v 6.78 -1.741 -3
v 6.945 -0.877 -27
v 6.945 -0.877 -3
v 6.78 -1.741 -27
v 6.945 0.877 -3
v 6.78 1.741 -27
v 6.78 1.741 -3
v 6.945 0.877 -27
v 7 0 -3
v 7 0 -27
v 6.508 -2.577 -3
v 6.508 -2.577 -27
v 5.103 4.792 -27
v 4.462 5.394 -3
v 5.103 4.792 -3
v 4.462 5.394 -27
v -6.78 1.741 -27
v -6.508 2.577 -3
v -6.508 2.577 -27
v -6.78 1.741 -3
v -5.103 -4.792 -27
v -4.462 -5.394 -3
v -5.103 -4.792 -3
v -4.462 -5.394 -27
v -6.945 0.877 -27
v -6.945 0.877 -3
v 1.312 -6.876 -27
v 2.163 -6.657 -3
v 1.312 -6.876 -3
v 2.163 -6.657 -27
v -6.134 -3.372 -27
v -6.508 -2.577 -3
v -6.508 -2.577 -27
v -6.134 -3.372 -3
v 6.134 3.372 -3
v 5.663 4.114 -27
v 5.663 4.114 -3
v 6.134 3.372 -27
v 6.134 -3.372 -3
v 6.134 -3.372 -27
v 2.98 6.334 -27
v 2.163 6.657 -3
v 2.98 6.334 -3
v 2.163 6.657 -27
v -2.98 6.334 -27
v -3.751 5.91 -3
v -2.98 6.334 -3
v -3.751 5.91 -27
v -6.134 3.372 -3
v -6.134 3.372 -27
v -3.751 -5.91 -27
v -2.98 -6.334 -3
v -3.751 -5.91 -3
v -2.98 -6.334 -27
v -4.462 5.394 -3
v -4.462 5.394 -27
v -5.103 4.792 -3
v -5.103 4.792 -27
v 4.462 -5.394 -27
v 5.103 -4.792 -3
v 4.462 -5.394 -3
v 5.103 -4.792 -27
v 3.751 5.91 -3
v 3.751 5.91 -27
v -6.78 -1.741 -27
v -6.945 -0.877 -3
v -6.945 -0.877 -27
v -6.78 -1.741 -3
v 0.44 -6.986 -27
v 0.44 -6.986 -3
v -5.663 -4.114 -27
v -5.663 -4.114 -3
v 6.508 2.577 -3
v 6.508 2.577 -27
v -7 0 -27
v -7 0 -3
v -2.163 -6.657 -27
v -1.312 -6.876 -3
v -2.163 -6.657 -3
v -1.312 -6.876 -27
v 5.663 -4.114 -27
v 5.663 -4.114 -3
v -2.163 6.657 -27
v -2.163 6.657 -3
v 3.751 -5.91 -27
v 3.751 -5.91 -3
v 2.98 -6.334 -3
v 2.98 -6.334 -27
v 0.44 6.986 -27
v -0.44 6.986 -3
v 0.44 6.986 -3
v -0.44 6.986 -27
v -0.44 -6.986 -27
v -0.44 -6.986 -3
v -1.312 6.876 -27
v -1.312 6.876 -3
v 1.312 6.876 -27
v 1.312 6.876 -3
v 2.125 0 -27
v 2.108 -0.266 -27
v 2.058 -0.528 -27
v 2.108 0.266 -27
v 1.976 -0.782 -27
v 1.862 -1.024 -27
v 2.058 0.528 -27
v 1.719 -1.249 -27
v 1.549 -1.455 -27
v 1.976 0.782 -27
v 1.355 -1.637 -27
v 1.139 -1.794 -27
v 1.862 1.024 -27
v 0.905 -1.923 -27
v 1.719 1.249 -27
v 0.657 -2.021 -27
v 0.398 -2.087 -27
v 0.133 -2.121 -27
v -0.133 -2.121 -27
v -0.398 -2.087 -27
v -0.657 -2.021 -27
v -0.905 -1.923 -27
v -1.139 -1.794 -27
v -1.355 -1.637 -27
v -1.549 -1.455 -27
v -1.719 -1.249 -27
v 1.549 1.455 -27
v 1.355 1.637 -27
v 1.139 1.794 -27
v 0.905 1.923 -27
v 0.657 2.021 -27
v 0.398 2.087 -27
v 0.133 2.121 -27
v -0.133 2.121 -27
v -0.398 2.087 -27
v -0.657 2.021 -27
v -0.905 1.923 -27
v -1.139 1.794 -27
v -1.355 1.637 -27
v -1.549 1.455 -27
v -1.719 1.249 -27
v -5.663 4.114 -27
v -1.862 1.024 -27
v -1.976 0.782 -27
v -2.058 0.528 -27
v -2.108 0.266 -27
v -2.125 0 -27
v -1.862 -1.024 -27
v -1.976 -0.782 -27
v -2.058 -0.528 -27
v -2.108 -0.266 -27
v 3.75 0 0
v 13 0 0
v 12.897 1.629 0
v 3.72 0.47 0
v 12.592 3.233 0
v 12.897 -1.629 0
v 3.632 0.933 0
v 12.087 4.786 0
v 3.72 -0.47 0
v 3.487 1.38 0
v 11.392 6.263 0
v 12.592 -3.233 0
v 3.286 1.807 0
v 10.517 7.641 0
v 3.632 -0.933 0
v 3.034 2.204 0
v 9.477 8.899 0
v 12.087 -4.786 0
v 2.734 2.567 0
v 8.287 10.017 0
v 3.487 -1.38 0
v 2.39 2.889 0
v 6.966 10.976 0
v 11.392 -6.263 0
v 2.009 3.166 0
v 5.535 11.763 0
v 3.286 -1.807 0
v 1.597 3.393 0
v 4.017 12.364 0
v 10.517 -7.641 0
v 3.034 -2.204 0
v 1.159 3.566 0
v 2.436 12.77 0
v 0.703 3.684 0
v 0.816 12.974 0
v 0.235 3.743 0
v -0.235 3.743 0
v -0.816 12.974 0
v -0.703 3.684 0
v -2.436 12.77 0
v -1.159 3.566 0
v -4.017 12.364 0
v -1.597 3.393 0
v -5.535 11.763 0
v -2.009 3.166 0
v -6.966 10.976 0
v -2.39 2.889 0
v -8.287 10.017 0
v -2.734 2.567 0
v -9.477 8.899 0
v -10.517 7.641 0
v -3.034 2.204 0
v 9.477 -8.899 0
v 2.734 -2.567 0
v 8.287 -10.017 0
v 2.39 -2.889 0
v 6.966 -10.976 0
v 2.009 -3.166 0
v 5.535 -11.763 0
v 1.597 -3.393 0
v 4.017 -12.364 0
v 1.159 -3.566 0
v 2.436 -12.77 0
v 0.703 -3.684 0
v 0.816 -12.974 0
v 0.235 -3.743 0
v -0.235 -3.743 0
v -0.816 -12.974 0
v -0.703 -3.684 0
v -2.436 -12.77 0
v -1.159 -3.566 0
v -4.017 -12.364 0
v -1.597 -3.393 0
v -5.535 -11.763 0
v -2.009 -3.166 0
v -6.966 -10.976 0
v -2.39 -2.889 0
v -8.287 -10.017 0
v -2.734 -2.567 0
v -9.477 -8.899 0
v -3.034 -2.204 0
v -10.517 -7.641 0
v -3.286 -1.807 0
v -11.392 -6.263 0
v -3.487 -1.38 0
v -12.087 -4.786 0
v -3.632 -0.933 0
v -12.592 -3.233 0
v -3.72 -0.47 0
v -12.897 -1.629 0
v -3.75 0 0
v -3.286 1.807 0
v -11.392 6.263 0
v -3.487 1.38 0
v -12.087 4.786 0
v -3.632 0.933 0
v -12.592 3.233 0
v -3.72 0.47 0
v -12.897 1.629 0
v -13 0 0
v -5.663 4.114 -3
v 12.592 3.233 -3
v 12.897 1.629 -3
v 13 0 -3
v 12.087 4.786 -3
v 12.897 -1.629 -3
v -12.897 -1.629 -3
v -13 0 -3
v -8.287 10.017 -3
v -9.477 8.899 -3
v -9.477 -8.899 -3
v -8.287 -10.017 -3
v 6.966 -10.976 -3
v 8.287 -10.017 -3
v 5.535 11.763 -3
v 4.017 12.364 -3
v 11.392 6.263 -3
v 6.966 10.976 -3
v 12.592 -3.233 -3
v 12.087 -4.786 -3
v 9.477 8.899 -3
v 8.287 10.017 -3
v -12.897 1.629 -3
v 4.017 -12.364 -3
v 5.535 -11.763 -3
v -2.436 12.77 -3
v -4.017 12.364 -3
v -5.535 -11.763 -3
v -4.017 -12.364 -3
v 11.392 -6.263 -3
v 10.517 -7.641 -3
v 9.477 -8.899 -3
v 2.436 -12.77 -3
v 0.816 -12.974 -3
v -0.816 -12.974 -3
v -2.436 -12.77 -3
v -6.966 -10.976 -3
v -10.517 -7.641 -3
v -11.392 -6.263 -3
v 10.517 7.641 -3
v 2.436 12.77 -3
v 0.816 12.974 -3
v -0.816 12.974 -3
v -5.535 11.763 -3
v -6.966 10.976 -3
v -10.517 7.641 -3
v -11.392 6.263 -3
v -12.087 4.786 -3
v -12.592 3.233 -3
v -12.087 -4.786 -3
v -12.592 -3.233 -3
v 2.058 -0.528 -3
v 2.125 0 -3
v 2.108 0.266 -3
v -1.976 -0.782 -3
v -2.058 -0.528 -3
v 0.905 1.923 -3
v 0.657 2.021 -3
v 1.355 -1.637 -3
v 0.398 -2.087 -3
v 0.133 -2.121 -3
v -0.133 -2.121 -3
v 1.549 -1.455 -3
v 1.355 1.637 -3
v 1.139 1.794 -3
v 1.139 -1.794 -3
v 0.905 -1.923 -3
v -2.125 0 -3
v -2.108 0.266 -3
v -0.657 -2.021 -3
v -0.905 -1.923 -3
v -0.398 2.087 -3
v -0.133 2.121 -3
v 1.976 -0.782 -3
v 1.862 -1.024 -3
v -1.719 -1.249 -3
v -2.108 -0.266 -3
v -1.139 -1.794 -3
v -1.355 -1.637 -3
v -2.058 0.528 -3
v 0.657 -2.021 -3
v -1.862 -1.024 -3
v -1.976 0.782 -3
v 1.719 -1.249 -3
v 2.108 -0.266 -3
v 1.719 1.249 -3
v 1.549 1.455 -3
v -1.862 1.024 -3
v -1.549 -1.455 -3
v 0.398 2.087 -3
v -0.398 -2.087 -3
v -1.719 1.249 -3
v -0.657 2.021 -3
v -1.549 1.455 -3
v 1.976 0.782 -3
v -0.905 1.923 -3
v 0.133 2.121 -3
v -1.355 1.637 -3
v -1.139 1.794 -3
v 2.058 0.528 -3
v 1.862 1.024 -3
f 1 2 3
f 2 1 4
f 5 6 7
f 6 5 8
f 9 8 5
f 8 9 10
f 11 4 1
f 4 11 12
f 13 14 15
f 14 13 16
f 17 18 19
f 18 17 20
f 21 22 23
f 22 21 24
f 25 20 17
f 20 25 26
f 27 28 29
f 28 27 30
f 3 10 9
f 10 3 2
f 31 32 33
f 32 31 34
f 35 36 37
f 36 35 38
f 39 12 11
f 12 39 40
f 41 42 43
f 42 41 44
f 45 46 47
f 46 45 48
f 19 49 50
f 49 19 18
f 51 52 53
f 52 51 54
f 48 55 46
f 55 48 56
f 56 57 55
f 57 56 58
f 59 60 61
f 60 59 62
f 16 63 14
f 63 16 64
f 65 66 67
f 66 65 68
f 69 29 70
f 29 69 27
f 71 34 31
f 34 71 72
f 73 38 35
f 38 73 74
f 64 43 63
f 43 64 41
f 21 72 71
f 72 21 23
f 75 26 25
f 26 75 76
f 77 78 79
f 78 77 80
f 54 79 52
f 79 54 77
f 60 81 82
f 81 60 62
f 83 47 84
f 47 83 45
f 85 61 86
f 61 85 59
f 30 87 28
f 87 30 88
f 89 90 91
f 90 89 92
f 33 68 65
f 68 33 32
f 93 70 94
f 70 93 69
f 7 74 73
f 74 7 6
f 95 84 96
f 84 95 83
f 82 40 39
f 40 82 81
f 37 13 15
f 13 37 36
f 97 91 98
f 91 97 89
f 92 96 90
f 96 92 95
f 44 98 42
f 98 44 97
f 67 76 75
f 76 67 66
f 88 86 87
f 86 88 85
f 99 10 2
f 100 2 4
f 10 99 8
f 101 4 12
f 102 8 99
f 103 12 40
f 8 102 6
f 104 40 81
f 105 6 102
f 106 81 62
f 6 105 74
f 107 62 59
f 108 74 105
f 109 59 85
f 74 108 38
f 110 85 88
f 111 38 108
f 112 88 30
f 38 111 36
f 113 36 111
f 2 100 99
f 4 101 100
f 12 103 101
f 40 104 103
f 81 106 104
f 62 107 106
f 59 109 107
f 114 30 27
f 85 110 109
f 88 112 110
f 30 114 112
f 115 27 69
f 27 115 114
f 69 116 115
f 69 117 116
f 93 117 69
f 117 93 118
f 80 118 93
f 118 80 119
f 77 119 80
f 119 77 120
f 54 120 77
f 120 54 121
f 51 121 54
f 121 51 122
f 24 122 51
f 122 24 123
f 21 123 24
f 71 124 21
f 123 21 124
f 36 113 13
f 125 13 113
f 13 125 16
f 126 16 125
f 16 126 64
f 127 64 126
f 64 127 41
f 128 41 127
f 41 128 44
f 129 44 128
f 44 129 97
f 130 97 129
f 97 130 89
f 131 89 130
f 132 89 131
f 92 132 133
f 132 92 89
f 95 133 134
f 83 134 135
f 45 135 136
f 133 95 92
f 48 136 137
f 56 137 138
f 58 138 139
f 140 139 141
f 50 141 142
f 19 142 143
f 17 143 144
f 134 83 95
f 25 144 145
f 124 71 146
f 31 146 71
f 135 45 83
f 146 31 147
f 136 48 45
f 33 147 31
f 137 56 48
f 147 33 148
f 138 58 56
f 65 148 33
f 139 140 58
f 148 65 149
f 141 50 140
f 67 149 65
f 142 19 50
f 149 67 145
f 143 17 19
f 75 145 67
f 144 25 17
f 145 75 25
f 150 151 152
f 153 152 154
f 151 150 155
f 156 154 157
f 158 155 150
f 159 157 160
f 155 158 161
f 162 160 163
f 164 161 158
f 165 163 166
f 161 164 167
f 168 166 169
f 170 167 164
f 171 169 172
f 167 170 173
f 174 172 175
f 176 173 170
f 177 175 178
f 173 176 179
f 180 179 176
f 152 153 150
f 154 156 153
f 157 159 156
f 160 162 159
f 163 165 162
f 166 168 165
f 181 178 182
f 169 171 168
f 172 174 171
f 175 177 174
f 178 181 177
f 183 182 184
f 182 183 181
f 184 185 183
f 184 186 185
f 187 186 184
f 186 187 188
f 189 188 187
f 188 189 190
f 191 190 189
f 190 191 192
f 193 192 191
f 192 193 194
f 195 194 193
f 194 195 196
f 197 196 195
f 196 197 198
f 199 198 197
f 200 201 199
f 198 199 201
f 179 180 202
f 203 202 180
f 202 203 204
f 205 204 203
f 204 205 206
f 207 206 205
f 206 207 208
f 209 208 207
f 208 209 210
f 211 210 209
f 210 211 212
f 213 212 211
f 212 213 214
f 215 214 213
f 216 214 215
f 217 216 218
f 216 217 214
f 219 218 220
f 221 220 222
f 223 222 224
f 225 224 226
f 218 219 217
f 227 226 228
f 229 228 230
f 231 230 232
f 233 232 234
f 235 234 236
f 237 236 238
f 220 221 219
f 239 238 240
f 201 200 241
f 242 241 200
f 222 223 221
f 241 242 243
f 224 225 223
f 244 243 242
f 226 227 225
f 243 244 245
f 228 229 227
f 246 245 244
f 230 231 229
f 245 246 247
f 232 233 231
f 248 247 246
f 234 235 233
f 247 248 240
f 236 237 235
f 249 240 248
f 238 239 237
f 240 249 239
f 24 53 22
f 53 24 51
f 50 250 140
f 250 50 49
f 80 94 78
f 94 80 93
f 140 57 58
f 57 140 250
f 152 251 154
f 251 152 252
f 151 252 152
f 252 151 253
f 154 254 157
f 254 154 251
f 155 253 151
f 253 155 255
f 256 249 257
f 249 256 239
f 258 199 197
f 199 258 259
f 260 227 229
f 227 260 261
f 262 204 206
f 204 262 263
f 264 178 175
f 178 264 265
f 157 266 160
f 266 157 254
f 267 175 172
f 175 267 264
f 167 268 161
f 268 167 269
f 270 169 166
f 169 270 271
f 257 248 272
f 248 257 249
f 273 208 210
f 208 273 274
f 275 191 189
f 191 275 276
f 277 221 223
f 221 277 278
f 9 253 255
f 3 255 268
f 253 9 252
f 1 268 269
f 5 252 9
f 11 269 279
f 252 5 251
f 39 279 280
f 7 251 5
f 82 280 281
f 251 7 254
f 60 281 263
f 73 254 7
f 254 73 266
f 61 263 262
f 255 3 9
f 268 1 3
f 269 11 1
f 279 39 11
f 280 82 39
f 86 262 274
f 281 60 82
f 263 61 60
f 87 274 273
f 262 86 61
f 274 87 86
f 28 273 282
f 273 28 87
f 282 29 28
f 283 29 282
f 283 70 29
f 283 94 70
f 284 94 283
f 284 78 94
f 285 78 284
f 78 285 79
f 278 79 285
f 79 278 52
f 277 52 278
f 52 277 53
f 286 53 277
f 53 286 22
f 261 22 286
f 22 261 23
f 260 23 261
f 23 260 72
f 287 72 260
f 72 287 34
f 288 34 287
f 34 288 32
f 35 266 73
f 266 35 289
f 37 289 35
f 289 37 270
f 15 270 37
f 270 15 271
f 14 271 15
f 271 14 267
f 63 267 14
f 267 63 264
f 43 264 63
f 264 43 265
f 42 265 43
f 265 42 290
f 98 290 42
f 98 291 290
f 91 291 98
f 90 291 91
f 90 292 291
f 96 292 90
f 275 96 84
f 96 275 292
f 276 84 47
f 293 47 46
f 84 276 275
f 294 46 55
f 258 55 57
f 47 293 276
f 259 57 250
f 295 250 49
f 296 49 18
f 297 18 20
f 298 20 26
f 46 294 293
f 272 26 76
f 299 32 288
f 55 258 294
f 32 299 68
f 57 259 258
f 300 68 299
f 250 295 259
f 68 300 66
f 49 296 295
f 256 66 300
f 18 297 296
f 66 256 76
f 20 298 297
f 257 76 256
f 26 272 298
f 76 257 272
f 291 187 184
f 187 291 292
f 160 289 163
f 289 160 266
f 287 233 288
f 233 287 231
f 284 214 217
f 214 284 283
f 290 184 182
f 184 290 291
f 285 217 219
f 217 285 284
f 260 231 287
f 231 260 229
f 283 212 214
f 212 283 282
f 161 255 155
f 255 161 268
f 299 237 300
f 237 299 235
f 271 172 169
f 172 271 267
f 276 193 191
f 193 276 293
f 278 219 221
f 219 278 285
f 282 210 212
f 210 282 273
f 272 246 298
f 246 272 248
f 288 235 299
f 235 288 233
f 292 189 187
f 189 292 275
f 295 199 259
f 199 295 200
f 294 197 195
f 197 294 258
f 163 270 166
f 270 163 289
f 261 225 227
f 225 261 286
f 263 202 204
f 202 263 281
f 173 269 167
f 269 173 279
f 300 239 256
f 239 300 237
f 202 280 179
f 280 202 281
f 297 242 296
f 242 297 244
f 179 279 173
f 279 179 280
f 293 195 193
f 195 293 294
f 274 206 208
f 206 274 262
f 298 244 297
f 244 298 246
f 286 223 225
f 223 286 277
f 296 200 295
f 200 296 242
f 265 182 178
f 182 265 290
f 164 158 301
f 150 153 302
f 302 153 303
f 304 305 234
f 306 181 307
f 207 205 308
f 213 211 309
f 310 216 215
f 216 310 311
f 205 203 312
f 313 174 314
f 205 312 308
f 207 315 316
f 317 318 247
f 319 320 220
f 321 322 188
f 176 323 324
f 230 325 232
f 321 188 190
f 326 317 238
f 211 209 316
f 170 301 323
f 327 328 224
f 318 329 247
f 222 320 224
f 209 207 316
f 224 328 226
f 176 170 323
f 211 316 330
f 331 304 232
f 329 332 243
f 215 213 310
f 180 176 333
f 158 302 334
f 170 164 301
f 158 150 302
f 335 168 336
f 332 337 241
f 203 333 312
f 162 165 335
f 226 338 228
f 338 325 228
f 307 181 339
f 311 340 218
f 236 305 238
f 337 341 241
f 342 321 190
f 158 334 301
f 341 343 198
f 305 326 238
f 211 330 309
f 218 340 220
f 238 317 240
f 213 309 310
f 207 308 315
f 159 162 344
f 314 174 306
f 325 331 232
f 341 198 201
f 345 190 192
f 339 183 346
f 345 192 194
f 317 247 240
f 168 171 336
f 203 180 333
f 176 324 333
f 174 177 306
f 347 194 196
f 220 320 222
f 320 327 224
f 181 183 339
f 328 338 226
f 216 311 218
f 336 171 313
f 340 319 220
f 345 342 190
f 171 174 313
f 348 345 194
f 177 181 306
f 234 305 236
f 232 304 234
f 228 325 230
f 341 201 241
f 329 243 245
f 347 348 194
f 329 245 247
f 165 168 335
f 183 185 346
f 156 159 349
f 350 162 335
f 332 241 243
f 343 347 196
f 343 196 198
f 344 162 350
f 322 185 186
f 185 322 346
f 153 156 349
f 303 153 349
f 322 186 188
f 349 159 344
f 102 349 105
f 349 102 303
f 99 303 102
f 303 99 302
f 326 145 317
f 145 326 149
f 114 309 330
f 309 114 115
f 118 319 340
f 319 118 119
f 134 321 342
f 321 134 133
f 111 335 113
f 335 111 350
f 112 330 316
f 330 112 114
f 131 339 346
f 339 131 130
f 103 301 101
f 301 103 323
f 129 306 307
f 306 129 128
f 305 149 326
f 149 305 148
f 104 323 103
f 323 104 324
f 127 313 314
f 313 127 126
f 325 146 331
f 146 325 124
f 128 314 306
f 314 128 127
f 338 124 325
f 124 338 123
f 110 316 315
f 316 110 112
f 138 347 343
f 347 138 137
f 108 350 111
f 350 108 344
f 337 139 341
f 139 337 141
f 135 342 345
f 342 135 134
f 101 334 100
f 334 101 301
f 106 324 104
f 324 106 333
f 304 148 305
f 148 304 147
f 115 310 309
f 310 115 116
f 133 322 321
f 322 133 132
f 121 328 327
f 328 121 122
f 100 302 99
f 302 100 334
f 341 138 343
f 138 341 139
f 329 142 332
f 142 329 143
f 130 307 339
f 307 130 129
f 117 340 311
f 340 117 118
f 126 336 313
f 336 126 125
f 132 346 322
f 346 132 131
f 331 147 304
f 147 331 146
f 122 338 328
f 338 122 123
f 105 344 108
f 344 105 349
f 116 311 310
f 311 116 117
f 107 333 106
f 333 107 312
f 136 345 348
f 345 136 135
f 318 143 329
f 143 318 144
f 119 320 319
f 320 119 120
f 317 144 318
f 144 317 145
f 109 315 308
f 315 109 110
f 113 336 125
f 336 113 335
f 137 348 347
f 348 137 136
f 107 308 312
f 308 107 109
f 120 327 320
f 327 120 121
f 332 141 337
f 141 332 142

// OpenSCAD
$fn = 50;


difference() {
	union() {
		translate(v = [0, 0, -27.0000000000]) {
			cylinder(h = 27, r = 7.0000000000);
		}
		translate(v = [0, 0, -3.0000000000]) {
			cylinder(h = 3, r = 13.0000000000);
		}
	}
	union() {
		translate(v = [0, 0, 0]) {
			rotate(a = [0, 0, 0]) {
				difference() {
					union() {
						#translate(v = [0, 0, -27.0000000000]) {
							cylinder(h = 27, r = 2.0000000000);
						}
						#translate(v = [0, 0, -3]) {
							cylinder(h = 3, r = 7.0000000000, r1 = 2.1250000000, r2 = 3.7500000000);
						}
						#translate(v = [0, 0, -27.0000000000]) {
							cylinder(h = 27, r = 2.1250000000);
						}
						#translate(v = [0, 0, -27.0000000000]) {
							cylinder(h = 27, r = 2.0000000000);
						}
					}
					union();
				}
			}
		}
	}
}
